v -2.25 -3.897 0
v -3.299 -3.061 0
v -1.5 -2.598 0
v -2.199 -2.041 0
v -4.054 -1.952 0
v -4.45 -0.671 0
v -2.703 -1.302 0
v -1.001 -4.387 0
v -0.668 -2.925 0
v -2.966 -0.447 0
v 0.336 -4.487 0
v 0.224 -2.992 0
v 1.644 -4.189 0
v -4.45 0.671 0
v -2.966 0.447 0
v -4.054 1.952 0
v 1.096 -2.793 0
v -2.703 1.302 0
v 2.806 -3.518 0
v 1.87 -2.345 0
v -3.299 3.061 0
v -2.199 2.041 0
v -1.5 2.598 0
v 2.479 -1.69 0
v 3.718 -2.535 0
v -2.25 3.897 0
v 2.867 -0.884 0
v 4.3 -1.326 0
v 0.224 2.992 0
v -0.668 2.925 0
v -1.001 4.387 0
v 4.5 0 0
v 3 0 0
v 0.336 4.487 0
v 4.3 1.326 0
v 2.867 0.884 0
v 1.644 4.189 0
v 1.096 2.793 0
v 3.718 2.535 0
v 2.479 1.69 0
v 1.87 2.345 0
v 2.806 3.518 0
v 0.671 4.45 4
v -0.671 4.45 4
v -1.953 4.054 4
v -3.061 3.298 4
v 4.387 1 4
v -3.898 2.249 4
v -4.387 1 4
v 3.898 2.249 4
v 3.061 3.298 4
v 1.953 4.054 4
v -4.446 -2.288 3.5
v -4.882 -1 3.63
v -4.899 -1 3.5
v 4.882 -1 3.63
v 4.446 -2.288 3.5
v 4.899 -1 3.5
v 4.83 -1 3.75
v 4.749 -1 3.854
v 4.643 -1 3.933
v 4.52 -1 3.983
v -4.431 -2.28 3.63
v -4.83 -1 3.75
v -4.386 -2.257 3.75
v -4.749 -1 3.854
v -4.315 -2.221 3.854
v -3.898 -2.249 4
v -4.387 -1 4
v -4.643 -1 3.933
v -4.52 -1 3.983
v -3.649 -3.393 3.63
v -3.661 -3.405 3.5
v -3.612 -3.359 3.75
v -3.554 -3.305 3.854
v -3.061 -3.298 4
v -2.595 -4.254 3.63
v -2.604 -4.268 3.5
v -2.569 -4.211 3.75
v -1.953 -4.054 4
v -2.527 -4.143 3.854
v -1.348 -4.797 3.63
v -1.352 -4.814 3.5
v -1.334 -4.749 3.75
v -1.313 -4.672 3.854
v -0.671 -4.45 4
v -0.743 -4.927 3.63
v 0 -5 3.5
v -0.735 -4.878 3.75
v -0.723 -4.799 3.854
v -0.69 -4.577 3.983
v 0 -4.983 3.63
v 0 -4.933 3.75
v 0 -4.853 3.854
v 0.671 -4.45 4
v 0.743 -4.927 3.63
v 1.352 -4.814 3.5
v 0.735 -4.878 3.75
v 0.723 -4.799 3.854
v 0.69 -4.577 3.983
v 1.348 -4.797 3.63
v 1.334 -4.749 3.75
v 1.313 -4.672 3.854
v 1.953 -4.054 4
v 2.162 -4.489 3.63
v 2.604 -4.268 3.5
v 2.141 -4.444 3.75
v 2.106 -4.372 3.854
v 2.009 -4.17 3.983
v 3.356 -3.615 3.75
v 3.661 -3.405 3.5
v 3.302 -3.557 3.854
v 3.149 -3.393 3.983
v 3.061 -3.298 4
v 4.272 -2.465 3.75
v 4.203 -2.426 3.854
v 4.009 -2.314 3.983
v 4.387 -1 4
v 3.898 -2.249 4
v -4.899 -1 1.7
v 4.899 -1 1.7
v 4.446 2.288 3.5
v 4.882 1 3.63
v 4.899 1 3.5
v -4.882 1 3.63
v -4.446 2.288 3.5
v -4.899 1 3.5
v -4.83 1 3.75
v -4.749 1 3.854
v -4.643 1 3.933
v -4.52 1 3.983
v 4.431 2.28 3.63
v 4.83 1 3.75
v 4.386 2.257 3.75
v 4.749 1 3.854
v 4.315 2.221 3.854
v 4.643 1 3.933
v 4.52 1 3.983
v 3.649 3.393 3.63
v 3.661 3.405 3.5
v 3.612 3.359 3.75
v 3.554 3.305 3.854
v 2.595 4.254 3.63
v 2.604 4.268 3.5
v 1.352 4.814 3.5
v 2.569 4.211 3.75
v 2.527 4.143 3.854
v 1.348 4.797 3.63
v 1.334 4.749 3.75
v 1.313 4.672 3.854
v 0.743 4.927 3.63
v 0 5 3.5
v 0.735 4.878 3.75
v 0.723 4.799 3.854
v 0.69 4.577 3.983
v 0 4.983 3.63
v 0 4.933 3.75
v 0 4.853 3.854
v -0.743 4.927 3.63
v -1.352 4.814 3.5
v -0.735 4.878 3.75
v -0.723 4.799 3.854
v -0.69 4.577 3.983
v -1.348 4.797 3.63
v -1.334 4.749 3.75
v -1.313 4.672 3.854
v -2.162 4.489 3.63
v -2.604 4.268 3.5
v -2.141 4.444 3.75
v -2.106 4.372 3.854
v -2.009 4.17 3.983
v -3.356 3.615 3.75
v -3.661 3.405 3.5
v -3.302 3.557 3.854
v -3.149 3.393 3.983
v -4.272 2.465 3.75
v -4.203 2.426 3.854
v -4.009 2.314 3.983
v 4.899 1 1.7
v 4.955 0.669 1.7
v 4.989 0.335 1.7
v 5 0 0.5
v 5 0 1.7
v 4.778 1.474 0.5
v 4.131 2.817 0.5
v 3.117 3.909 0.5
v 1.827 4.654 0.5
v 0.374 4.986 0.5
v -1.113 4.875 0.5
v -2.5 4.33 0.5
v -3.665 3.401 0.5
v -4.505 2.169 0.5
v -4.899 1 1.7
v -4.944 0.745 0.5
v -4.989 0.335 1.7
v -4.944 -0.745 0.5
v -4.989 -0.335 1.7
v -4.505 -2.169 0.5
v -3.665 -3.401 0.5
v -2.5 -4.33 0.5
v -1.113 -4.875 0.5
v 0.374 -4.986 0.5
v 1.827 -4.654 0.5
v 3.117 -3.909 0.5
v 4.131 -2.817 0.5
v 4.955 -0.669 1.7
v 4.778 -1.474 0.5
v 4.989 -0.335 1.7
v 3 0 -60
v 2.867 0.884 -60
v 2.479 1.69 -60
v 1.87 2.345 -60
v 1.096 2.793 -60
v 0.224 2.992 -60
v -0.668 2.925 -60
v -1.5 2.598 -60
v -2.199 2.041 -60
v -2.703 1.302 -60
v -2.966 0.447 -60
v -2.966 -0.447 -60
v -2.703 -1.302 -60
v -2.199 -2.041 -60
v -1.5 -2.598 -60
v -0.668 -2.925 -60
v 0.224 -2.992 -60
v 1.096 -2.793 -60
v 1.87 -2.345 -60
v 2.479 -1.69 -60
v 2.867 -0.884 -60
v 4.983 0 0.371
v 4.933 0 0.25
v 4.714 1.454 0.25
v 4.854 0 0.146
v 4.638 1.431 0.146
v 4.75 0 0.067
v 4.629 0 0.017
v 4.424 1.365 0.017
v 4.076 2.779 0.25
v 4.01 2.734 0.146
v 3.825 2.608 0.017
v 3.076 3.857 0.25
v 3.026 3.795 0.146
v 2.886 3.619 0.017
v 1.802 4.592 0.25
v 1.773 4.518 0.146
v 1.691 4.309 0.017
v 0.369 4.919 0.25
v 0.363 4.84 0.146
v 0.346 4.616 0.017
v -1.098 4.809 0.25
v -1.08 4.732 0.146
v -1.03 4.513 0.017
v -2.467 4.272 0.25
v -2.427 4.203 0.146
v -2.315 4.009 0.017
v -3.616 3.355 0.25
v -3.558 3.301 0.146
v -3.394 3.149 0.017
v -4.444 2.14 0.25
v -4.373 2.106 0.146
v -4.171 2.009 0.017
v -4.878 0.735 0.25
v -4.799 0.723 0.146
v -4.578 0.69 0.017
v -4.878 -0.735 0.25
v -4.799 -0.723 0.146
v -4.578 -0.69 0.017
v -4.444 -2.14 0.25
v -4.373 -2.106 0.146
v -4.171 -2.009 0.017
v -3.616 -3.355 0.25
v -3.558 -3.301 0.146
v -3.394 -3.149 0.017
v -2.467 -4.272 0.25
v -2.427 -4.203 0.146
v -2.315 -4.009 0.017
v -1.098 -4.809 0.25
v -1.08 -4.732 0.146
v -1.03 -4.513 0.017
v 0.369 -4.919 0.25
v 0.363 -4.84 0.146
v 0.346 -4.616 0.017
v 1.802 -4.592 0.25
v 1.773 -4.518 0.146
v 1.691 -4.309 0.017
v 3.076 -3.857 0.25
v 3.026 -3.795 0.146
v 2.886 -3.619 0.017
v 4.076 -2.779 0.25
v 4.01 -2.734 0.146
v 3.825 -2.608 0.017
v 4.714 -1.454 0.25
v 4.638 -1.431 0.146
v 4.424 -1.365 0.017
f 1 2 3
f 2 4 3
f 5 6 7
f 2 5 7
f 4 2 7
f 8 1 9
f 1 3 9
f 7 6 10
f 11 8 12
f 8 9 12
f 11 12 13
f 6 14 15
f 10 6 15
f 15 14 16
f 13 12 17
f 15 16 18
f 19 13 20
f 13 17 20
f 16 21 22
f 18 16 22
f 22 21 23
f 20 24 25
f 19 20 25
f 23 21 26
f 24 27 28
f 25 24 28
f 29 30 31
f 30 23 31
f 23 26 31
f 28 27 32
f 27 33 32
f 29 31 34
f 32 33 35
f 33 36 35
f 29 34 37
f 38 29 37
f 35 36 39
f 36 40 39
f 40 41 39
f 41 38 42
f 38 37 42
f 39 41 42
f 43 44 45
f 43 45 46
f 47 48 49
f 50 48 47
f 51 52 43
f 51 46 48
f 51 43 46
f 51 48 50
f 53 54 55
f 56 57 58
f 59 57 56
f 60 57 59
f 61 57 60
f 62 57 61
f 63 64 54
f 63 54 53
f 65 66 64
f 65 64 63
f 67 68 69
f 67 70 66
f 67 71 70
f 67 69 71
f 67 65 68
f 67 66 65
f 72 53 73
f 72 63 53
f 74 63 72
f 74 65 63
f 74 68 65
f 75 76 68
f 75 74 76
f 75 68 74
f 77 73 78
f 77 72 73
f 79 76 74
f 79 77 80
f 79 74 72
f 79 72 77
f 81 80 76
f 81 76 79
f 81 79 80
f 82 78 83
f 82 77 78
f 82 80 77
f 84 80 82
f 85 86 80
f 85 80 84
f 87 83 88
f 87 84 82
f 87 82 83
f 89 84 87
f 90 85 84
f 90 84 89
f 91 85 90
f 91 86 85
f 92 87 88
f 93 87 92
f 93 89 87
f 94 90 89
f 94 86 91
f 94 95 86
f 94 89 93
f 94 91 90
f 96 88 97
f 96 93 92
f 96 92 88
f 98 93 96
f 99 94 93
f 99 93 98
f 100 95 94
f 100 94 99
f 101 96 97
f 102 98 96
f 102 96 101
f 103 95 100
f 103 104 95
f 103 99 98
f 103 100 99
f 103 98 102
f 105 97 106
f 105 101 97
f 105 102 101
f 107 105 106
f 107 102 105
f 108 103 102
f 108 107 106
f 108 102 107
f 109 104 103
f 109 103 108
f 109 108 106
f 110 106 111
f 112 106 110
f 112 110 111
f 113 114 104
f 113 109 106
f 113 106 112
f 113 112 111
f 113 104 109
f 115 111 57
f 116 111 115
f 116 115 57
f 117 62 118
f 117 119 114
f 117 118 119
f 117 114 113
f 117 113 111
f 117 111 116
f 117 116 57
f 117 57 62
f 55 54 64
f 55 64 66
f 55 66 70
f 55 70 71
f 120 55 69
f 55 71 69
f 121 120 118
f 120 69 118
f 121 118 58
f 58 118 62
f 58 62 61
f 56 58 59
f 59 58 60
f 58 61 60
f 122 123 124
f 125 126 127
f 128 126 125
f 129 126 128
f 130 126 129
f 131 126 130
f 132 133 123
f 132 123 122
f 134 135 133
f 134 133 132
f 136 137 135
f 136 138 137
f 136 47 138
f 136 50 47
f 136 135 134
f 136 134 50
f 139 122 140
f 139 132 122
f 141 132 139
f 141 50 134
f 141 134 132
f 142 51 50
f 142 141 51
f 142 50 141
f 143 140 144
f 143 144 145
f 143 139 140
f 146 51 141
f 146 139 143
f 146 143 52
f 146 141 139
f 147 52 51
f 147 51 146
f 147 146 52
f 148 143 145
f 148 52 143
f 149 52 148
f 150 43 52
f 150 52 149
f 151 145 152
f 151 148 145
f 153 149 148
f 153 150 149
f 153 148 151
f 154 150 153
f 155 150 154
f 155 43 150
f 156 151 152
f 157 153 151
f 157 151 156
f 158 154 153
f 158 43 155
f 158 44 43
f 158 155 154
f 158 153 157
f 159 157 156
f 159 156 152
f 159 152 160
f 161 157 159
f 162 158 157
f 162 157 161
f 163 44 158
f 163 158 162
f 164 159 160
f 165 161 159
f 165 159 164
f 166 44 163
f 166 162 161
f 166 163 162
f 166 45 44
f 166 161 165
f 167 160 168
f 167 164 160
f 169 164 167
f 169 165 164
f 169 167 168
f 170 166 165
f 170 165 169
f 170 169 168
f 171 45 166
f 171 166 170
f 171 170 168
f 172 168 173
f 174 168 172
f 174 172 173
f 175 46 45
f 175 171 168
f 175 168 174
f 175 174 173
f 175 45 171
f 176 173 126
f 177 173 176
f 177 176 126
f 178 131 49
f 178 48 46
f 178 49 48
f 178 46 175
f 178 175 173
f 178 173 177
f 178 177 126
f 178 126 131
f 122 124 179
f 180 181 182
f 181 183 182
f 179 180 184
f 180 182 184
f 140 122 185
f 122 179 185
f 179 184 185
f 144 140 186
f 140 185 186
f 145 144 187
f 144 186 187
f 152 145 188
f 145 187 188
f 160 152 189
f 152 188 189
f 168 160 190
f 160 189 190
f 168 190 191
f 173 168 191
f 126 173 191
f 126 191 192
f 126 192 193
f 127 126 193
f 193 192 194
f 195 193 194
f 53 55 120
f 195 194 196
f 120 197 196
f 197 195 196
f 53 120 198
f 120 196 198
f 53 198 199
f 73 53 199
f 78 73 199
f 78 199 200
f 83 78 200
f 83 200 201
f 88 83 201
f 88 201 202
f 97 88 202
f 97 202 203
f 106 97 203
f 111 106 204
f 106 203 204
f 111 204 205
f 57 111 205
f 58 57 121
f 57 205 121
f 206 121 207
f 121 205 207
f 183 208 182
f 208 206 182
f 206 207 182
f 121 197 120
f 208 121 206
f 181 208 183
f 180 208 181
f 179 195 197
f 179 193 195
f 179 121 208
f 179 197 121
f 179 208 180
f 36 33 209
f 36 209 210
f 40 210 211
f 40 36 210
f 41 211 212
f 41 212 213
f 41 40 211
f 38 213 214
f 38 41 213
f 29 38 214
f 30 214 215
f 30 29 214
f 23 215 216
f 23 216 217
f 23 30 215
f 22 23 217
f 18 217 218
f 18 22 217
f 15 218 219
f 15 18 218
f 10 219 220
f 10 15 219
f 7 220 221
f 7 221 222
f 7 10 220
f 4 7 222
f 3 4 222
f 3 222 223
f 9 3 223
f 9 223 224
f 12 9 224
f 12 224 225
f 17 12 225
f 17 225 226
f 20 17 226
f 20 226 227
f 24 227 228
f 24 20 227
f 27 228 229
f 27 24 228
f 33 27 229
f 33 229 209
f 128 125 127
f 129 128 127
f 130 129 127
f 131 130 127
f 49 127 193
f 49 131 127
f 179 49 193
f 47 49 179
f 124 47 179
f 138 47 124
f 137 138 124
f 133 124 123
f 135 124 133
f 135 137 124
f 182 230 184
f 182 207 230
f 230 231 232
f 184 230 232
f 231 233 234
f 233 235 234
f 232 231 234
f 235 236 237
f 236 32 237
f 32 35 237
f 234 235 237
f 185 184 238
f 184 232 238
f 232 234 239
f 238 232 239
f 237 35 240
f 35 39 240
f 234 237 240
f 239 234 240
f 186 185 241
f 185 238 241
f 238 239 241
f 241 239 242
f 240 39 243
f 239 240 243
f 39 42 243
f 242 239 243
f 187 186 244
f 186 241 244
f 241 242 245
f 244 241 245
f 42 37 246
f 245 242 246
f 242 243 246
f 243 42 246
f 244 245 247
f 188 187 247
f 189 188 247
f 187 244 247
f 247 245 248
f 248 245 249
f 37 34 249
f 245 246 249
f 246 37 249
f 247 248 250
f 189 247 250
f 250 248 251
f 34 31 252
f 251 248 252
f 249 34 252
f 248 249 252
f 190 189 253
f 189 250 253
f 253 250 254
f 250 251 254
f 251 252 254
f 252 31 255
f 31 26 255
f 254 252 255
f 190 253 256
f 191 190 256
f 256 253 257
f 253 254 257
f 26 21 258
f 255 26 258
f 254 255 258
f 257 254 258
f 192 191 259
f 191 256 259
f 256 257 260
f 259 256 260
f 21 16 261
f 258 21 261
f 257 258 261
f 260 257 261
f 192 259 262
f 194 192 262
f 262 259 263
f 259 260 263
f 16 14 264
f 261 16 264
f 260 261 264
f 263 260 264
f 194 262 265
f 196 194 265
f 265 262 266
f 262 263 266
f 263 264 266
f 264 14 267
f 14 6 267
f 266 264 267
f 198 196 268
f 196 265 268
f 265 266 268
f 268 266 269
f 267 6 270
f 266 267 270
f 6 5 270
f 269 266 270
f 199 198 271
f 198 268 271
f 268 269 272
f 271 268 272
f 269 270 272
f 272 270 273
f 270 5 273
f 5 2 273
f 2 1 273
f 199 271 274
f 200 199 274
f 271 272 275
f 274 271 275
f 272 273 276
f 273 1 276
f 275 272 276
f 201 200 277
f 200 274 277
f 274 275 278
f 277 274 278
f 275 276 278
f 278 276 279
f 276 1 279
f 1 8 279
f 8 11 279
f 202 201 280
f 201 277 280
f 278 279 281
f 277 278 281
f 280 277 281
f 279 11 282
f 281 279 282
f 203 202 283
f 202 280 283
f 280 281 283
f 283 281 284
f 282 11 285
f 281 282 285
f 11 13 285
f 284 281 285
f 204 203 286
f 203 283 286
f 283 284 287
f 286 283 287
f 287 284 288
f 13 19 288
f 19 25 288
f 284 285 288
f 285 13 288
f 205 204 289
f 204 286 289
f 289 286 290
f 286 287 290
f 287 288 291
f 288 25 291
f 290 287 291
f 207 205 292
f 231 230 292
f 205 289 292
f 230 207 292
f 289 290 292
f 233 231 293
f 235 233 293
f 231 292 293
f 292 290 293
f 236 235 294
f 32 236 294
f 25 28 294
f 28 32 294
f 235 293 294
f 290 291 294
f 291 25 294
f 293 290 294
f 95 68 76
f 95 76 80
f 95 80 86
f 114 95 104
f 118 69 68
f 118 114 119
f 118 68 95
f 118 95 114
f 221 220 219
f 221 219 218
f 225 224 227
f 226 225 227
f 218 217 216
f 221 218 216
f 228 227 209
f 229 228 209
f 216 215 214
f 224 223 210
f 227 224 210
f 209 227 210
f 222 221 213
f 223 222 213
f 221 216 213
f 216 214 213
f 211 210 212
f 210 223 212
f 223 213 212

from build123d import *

# Parameters (mm, degrees)
F0_R     = 3
F1_DEPTH = 60
F2_R     = 5
F3_DEPTH = 4
F4_R     = 0.5
F5_W     = 13
F5_H     = 2
F6_DEPTH = 2.3


with BuildPart() as f1:
    # F0 (on Top) → F1 (new body)
    with BuildSketch(Plane.XY):
        Circle(F0_R)
    extrude(amount=-F1_DEPTH)

    # F2 (on face) → F3 (join)
    with BuildSketch(Plane.XY):
        Circle(F2_R)
    extrude(amount=F3_DEPTH)

    # F4
    f4_edges = [f1.edges().sort_by_distance(p)[0] for p in [
        (-5, 0, 4),
        (-5, 0, 0),
    ]]
    fillet(f4_edges, radius=F4_R)

    # F5 (on face) → F6 (cut)
    with BuildSketch(Plane.XY.offset(4)):
        Rectangle(F5_W, F5_H)
    extrude(amount=-F6_DEPTH, mode=Mode.SUBTRACT)


solid = f1.part
